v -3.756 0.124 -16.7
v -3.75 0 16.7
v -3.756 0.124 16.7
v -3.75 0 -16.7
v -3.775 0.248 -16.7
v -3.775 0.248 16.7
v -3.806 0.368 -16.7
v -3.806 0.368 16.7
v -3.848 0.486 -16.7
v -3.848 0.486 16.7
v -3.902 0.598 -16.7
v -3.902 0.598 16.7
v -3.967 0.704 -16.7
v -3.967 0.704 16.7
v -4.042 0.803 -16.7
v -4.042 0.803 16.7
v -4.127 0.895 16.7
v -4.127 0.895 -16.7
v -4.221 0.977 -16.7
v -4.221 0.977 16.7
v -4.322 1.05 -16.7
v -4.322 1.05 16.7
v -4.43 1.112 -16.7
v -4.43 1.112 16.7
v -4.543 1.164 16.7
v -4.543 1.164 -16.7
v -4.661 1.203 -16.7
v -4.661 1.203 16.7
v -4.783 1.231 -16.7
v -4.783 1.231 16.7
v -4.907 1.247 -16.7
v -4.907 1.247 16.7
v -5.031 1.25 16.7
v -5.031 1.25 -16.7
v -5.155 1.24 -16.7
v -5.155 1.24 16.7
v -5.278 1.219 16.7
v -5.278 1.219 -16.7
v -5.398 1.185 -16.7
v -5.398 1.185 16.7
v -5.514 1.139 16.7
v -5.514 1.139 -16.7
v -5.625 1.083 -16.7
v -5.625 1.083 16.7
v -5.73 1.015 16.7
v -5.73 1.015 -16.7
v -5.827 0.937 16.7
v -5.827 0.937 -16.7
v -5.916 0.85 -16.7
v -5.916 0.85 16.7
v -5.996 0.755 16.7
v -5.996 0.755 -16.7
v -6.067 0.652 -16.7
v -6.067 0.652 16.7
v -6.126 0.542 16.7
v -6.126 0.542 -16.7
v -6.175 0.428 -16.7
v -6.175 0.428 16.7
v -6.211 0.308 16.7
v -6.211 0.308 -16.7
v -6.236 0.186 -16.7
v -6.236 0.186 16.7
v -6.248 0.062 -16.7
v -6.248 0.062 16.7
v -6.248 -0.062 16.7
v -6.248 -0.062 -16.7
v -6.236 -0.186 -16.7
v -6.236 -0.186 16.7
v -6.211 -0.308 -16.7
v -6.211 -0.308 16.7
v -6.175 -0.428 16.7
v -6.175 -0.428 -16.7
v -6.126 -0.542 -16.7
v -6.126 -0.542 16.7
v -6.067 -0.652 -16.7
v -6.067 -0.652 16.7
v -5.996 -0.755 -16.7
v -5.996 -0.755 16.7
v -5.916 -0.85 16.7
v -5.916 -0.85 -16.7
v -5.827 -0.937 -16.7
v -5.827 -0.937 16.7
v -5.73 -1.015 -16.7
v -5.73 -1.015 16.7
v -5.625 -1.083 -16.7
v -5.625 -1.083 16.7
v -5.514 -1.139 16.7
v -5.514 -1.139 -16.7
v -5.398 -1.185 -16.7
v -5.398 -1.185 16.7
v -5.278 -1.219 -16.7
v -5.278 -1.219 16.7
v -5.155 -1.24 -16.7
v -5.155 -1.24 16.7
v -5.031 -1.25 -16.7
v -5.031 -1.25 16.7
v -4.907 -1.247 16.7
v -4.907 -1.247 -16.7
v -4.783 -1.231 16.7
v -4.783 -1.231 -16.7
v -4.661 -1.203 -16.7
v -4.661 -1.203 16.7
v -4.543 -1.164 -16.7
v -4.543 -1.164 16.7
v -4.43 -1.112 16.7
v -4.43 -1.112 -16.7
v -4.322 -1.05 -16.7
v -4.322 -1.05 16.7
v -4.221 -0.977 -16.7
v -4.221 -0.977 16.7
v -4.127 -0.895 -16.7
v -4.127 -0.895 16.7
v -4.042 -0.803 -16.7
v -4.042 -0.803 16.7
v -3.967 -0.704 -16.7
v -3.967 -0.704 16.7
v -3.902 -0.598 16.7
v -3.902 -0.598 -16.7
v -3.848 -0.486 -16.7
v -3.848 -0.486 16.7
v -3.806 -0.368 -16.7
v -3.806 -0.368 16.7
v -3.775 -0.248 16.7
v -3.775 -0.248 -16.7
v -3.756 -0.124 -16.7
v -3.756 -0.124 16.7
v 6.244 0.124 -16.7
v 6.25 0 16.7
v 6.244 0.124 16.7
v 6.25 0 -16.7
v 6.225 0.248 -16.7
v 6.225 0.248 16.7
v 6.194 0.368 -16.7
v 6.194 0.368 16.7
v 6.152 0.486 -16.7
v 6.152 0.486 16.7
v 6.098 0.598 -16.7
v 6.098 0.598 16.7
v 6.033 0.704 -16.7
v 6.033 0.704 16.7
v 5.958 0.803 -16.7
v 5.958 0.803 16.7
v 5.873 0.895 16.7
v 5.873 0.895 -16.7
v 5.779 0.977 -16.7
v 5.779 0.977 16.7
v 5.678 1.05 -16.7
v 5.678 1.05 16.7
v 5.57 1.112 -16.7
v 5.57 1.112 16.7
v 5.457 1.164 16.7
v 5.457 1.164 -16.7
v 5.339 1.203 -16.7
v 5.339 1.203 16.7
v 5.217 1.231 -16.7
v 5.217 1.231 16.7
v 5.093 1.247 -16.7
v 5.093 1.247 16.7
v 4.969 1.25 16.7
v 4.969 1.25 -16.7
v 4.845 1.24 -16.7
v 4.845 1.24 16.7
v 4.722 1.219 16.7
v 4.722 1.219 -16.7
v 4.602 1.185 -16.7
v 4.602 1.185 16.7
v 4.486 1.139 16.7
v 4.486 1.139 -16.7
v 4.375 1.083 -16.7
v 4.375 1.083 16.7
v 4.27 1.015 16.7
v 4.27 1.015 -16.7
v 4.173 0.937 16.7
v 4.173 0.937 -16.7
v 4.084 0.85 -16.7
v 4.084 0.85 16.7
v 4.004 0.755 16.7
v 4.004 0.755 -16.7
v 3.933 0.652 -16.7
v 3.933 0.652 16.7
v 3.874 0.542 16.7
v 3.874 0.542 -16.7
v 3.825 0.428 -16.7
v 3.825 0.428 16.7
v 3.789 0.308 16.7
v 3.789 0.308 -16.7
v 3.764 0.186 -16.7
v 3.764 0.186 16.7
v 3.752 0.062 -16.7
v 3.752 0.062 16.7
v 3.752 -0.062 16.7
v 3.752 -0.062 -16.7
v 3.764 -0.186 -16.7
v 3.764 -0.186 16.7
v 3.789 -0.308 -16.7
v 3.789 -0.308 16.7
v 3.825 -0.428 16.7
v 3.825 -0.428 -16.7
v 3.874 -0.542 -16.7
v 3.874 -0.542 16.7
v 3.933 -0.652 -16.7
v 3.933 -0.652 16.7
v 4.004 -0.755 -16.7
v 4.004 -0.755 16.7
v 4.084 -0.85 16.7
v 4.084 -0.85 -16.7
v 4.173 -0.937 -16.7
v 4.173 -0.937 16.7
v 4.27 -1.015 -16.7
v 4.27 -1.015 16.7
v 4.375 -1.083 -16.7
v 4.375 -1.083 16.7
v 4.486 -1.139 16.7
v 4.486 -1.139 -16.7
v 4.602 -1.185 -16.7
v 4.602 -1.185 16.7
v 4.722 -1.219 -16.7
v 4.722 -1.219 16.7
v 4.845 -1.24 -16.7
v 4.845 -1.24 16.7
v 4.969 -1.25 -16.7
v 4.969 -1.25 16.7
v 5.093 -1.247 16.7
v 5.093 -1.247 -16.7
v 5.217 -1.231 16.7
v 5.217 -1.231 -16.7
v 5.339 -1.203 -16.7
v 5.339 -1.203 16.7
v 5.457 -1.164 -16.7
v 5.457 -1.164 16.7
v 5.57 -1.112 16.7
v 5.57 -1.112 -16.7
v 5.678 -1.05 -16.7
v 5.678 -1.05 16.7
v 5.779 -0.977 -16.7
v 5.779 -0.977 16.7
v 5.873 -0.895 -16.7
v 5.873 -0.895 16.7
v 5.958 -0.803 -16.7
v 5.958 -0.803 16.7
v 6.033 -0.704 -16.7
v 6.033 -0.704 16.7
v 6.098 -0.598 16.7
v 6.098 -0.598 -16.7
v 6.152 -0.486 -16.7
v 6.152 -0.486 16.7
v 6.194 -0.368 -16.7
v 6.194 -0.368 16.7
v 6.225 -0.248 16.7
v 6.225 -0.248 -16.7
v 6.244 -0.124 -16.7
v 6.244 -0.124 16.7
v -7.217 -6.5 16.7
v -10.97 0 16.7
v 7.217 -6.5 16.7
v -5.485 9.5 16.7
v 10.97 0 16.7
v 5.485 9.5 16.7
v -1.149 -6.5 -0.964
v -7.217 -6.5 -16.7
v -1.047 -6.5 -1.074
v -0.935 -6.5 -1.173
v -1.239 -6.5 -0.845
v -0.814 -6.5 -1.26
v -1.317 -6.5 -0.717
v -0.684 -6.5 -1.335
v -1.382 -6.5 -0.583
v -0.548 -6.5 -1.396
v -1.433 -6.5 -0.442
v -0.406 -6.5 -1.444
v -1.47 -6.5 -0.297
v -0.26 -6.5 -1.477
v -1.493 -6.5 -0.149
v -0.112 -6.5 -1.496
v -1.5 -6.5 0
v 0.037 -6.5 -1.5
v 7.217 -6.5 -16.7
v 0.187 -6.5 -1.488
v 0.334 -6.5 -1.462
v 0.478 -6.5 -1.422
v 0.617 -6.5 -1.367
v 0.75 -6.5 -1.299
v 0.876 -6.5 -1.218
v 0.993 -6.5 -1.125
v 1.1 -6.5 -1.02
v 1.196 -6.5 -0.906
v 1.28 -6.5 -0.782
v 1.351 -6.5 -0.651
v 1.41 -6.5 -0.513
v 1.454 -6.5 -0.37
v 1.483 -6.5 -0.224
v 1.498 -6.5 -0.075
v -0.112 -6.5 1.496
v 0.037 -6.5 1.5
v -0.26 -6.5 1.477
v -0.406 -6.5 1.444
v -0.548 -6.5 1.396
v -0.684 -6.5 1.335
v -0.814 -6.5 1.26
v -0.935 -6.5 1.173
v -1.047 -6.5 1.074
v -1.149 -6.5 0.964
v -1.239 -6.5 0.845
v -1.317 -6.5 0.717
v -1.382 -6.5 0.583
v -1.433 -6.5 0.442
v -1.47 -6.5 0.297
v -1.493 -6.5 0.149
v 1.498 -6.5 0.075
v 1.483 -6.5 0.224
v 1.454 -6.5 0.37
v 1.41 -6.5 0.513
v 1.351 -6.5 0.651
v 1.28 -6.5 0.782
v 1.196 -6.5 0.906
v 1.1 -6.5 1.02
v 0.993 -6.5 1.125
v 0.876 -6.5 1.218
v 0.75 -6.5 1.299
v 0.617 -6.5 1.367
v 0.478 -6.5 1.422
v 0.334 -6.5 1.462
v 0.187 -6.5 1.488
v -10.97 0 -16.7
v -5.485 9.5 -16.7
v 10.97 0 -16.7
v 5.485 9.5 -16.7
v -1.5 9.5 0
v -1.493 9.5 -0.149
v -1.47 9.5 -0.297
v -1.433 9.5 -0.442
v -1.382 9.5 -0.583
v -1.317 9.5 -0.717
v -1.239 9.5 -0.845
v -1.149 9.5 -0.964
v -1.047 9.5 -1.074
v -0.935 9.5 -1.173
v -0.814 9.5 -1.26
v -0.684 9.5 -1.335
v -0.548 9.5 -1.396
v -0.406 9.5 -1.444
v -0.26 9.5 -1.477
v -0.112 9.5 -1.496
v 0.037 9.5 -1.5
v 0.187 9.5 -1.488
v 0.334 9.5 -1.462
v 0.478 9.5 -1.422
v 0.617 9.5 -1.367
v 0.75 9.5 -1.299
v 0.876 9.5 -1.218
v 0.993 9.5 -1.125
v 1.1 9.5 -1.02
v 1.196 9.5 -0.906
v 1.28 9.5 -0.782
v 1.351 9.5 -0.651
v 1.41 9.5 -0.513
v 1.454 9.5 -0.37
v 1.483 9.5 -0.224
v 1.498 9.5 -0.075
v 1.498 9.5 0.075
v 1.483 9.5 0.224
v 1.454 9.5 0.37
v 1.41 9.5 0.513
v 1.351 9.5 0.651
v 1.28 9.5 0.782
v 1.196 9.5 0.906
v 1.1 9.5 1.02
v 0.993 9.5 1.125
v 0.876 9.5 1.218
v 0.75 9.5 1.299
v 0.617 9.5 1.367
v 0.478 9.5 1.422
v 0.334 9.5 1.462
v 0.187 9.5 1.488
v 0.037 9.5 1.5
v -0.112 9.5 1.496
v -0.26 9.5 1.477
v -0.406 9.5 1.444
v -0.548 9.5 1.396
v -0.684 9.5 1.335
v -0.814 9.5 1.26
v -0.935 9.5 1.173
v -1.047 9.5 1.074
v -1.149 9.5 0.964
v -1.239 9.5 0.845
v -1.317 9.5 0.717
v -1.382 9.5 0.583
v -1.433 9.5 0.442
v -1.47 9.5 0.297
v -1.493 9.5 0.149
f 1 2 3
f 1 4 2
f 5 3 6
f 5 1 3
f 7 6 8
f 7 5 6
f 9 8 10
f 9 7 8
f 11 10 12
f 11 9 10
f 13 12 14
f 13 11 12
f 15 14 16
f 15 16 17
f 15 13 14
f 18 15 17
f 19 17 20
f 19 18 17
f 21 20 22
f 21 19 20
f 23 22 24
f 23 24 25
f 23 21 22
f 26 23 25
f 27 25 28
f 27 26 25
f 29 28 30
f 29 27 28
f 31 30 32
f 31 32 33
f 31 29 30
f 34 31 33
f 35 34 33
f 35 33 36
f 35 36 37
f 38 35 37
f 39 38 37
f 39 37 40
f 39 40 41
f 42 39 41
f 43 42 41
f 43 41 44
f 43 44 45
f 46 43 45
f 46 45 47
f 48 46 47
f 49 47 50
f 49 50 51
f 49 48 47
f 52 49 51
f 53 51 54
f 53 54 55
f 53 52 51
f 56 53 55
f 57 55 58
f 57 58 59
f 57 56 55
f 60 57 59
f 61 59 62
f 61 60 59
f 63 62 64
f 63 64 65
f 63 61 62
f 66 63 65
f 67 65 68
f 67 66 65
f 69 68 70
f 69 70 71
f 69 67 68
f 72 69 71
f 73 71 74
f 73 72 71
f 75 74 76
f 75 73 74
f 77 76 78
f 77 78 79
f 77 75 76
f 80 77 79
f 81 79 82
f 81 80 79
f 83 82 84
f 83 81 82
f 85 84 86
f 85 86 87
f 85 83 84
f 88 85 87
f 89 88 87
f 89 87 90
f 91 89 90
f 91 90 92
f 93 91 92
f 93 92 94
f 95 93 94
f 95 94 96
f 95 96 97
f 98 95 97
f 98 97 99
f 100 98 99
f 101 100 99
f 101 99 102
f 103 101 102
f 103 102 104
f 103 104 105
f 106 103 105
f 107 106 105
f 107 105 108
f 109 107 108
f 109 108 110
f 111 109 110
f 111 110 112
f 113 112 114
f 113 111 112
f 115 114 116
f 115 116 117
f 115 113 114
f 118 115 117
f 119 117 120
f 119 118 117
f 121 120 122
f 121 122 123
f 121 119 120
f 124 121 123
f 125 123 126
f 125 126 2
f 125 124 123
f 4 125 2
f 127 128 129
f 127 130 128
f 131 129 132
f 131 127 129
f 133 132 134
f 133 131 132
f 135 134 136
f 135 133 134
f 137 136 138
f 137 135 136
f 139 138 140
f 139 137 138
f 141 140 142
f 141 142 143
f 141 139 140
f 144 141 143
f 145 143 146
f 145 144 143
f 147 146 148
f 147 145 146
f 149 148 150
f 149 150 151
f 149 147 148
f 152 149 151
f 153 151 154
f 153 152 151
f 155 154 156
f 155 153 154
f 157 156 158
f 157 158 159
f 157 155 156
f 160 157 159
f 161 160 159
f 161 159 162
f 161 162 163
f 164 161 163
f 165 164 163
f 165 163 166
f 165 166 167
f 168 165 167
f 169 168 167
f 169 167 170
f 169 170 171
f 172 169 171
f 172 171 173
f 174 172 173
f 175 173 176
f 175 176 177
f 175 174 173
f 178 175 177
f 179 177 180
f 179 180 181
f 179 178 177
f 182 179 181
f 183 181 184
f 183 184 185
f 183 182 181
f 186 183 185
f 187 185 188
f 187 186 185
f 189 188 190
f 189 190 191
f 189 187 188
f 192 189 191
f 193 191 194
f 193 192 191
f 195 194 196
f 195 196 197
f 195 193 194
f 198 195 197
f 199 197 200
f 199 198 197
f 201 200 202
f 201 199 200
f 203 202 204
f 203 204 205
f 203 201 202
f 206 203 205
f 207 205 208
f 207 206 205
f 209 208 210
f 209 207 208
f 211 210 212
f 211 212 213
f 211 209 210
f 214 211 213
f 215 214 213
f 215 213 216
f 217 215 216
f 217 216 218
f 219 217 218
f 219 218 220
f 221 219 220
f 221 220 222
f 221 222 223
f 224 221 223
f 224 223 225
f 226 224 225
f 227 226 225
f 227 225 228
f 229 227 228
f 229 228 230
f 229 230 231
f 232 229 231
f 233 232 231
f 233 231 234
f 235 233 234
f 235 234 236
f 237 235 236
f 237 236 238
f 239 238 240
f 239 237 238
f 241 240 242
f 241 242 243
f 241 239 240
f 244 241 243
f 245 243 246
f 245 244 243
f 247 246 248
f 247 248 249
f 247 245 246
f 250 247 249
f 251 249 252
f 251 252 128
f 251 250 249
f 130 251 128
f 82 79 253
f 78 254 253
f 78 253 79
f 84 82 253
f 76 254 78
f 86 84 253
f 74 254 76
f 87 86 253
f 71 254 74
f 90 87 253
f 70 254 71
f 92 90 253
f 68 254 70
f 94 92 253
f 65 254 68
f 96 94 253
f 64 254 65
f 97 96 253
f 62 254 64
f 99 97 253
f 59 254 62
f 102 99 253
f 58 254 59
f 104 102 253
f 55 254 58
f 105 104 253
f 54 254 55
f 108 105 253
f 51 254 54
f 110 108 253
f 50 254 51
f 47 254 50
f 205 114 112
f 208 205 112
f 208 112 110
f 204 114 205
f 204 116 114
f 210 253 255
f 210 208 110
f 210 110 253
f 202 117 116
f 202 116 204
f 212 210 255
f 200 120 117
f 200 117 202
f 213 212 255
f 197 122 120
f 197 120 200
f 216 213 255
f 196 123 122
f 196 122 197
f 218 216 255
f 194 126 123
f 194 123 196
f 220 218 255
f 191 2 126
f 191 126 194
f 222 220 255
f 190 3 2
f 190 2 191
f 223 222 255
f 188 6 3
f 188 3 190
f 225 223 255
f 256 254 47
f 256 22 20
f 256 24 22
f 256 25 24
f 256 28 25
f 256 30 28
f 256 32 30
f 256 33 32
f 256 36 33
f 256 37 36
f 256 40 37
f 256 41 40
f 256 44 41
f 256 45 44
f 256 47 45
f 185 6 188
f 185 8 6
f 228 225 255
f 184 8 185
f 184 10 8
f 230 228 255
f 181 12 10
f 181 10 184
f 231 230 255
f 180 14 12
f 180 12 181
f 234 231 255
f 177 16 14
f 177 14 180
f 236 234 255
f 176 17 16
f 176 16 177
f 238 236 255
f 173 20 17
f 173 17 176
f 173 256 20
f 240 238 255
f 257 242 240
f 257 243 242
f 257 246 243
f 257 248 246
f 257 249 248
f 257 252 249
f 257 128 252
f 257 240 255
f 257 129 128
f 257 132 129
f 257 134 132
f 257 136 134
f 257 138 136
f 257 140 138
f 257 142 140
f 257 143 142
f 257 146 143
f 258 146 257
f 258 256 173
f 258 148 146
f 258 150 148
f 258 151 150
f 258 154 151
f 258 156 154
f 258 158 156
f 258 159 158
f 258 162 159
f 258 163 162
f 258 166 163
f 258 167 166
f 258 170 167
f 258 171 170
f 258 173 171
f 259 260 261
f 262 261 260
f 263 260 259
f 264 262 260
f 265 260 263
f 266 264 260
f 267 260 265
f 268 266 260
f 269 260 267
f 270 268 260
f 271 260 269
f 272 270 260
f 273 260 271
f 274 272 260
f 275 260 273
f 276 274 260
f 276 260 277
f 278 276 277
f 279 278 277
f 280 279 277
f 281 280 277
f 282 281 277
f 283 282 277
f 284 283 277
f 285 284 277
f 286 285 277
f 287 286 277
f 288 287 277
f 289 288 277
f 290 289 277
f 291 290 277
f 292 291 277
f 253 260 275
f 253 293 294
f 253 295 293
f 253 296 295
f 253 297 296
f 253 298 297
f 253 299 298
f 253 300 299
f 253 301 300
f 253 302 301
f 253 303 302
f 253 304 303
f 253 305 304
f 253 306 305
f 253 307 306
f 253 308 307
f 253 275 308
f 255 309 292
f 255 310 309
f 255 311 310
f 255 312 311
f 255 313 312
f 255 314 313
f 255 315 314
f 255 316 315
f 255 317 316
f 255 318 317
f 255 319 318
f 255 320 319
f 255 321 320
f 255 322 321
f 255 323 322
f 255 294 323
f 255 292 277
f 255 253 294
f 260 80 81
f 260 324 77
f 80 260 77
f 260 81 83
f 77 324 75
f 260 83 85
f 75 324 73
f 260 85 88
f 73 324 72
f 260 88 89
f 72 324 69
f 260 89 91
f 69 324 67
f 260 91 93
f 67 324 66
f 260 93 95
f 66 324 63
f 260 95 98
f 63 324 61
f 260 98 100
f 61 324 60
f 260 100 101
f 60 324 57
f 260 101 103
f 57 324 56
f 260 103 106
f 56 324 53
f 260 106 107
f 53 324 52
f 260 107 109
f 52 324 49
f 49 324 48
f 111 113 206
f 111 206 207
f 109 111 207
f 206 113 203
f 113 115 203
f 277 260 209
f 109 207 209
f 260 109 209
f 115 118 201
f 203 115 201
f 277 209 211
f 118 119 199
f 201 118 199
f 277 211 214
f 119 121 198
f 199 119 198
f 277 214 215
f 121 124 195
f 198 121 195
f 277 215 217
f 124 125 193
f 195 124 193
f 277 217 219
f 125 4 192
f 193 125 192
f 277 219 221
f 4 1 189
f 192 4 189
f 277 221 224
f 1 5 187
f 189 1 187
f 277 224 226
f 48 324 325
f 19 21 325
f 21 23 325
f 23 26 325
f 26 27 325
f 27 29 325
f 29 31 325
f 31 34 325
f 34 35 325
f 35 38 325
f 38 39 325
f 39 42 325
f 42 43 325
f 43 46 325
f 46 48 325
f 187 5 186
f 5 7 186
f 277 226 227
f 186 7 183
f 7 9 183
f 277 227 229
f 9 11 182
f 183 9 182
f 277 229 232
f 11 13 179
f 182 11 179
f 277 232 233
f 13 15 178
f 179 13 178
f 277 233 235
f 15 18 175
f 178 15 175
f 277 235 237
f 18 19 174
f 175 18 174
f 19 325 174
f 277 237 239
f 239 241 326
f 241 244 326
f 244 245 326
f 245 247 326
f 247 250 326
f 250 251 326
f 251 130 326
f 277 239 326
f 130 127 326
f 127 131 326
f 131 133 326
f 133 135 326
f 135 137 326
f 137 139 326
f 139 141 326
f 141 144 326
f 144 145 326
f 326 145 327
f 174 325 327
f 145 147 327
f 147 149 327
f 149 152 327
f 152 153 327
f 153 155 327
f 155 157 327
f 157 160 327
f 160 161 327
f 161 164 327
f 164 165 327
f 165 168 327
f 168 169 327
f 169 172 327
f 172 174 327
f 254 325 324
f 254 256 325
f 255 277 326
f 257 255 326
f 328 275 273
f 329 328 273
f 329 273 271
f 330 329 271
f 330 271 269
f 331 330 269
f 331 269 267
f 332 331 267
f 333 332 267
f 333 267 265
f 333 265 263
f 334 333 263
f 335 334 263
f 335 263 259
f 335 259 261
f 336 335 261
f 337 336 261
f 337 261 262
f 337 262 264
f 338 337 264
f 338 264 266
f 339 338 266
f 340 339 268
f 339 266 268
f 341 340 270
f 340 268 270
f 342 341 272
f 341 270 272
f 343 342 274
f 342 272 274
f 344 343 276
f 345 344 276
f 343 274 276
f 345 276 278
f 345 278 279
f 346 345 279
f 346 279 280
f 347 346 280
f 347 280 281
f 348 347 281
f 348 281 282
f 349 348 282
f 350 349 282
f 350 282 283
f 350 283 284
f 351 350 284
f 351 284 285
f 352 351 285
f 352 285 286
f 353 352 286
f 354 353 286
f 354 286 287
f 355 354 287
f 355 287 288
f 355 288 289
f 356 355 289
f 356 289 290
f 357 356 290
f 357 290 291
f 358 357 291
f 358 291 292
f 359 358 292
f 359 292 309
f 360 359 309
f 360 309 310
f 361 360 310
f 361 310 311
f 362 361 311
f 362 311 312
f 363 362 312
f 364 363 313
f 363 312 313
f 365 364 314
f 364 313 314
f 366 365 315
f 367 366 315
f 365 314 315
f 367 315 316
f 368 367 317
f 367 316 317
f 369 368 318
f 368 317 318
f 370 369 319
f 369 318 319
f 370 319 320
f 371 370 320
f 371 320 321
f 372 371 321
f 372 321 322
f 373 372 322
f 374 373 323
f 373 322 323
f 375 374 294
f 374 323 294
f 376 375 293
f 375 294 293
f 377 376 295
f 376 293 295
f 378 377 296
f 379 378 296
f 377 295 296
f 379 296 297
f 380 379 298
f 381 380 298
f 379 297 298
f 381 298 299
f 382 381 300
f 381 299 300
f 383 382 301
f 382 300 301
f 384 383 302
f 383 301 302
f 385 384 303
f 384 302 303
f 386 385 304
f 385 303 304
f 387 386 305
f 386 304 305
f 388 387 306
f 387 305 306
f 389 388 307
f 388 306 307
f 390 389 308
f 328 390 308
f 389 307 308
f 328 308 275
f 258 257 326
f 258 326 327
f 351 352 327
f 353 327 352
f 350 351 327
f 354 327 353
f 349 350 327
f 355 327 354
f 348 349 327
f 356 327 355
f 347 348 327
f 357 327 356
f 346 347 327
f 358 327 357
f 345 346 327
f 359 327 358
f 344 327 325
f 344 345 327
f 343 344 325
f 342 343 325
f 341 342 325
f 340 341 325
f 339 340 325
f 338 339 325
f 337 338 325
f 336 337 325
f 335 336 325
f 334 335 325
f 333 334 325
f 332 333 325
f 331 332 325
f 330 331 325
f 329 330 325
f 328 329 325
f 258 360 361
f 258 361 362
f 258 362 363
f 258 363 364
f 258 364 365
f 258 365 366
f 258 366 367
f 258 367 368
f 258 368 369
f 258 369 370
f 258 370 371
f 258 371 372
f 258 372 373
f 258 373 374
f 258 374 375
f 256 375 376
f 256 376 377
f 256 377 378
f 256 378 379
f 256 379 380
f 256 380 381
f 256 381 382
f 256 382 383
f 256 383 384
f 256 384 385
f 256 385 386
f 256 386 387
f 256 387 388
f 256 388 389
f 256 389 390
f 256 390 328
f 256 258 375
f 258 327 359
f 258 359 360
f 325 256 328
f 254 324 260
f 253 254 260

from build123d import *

# Parameters (mm, degrees)
SKETCH1_R                   = 1.25
BOSS_EXTRUDE1_DEPTH         = 16.7
F_1_4_28_TAPPED_HOLE1_D     = 3
F_1_4_28_TAPPED_HOLE1_DEPTH = 16


with BuildPart() as part:
    # Sketch1 → Boss-Extrude1 (new body, symmetric)
    with BuildSketch(Plane.XY):
        Polygon((-7.216878365, -6.5), (7.216878365, -6.5), (10.969655115, 0), (5.484827557, 9.5), (-5.484827557, 9.5), (-10.969655115, 0), align=None)
        with Locations((-5, 0)):
            Circle(SKETCH1_R, mode=Mode.SUBTRACT)
        with Locations((5, 0)):
            Circle(SKETCH1_R, mode=Mode.SUBTRACT)
    extrude(amount=BOSS_EXTRUDE1_DEPTH, both=True)

    # 1/4-28 Tapped Hole1
    with Locations(Plane(origin=(0, 9.5, 0), x_dir=(1, 0, 0), z_dir=(0, 1, 0))):
        with Locations((0, 0)):
            Hole(F_1_4_28_TAPPED_HOLE1_D / 2, depth=F_1_4_28_TAPPED_HOLE1_DEPTH)


solid = part.part
